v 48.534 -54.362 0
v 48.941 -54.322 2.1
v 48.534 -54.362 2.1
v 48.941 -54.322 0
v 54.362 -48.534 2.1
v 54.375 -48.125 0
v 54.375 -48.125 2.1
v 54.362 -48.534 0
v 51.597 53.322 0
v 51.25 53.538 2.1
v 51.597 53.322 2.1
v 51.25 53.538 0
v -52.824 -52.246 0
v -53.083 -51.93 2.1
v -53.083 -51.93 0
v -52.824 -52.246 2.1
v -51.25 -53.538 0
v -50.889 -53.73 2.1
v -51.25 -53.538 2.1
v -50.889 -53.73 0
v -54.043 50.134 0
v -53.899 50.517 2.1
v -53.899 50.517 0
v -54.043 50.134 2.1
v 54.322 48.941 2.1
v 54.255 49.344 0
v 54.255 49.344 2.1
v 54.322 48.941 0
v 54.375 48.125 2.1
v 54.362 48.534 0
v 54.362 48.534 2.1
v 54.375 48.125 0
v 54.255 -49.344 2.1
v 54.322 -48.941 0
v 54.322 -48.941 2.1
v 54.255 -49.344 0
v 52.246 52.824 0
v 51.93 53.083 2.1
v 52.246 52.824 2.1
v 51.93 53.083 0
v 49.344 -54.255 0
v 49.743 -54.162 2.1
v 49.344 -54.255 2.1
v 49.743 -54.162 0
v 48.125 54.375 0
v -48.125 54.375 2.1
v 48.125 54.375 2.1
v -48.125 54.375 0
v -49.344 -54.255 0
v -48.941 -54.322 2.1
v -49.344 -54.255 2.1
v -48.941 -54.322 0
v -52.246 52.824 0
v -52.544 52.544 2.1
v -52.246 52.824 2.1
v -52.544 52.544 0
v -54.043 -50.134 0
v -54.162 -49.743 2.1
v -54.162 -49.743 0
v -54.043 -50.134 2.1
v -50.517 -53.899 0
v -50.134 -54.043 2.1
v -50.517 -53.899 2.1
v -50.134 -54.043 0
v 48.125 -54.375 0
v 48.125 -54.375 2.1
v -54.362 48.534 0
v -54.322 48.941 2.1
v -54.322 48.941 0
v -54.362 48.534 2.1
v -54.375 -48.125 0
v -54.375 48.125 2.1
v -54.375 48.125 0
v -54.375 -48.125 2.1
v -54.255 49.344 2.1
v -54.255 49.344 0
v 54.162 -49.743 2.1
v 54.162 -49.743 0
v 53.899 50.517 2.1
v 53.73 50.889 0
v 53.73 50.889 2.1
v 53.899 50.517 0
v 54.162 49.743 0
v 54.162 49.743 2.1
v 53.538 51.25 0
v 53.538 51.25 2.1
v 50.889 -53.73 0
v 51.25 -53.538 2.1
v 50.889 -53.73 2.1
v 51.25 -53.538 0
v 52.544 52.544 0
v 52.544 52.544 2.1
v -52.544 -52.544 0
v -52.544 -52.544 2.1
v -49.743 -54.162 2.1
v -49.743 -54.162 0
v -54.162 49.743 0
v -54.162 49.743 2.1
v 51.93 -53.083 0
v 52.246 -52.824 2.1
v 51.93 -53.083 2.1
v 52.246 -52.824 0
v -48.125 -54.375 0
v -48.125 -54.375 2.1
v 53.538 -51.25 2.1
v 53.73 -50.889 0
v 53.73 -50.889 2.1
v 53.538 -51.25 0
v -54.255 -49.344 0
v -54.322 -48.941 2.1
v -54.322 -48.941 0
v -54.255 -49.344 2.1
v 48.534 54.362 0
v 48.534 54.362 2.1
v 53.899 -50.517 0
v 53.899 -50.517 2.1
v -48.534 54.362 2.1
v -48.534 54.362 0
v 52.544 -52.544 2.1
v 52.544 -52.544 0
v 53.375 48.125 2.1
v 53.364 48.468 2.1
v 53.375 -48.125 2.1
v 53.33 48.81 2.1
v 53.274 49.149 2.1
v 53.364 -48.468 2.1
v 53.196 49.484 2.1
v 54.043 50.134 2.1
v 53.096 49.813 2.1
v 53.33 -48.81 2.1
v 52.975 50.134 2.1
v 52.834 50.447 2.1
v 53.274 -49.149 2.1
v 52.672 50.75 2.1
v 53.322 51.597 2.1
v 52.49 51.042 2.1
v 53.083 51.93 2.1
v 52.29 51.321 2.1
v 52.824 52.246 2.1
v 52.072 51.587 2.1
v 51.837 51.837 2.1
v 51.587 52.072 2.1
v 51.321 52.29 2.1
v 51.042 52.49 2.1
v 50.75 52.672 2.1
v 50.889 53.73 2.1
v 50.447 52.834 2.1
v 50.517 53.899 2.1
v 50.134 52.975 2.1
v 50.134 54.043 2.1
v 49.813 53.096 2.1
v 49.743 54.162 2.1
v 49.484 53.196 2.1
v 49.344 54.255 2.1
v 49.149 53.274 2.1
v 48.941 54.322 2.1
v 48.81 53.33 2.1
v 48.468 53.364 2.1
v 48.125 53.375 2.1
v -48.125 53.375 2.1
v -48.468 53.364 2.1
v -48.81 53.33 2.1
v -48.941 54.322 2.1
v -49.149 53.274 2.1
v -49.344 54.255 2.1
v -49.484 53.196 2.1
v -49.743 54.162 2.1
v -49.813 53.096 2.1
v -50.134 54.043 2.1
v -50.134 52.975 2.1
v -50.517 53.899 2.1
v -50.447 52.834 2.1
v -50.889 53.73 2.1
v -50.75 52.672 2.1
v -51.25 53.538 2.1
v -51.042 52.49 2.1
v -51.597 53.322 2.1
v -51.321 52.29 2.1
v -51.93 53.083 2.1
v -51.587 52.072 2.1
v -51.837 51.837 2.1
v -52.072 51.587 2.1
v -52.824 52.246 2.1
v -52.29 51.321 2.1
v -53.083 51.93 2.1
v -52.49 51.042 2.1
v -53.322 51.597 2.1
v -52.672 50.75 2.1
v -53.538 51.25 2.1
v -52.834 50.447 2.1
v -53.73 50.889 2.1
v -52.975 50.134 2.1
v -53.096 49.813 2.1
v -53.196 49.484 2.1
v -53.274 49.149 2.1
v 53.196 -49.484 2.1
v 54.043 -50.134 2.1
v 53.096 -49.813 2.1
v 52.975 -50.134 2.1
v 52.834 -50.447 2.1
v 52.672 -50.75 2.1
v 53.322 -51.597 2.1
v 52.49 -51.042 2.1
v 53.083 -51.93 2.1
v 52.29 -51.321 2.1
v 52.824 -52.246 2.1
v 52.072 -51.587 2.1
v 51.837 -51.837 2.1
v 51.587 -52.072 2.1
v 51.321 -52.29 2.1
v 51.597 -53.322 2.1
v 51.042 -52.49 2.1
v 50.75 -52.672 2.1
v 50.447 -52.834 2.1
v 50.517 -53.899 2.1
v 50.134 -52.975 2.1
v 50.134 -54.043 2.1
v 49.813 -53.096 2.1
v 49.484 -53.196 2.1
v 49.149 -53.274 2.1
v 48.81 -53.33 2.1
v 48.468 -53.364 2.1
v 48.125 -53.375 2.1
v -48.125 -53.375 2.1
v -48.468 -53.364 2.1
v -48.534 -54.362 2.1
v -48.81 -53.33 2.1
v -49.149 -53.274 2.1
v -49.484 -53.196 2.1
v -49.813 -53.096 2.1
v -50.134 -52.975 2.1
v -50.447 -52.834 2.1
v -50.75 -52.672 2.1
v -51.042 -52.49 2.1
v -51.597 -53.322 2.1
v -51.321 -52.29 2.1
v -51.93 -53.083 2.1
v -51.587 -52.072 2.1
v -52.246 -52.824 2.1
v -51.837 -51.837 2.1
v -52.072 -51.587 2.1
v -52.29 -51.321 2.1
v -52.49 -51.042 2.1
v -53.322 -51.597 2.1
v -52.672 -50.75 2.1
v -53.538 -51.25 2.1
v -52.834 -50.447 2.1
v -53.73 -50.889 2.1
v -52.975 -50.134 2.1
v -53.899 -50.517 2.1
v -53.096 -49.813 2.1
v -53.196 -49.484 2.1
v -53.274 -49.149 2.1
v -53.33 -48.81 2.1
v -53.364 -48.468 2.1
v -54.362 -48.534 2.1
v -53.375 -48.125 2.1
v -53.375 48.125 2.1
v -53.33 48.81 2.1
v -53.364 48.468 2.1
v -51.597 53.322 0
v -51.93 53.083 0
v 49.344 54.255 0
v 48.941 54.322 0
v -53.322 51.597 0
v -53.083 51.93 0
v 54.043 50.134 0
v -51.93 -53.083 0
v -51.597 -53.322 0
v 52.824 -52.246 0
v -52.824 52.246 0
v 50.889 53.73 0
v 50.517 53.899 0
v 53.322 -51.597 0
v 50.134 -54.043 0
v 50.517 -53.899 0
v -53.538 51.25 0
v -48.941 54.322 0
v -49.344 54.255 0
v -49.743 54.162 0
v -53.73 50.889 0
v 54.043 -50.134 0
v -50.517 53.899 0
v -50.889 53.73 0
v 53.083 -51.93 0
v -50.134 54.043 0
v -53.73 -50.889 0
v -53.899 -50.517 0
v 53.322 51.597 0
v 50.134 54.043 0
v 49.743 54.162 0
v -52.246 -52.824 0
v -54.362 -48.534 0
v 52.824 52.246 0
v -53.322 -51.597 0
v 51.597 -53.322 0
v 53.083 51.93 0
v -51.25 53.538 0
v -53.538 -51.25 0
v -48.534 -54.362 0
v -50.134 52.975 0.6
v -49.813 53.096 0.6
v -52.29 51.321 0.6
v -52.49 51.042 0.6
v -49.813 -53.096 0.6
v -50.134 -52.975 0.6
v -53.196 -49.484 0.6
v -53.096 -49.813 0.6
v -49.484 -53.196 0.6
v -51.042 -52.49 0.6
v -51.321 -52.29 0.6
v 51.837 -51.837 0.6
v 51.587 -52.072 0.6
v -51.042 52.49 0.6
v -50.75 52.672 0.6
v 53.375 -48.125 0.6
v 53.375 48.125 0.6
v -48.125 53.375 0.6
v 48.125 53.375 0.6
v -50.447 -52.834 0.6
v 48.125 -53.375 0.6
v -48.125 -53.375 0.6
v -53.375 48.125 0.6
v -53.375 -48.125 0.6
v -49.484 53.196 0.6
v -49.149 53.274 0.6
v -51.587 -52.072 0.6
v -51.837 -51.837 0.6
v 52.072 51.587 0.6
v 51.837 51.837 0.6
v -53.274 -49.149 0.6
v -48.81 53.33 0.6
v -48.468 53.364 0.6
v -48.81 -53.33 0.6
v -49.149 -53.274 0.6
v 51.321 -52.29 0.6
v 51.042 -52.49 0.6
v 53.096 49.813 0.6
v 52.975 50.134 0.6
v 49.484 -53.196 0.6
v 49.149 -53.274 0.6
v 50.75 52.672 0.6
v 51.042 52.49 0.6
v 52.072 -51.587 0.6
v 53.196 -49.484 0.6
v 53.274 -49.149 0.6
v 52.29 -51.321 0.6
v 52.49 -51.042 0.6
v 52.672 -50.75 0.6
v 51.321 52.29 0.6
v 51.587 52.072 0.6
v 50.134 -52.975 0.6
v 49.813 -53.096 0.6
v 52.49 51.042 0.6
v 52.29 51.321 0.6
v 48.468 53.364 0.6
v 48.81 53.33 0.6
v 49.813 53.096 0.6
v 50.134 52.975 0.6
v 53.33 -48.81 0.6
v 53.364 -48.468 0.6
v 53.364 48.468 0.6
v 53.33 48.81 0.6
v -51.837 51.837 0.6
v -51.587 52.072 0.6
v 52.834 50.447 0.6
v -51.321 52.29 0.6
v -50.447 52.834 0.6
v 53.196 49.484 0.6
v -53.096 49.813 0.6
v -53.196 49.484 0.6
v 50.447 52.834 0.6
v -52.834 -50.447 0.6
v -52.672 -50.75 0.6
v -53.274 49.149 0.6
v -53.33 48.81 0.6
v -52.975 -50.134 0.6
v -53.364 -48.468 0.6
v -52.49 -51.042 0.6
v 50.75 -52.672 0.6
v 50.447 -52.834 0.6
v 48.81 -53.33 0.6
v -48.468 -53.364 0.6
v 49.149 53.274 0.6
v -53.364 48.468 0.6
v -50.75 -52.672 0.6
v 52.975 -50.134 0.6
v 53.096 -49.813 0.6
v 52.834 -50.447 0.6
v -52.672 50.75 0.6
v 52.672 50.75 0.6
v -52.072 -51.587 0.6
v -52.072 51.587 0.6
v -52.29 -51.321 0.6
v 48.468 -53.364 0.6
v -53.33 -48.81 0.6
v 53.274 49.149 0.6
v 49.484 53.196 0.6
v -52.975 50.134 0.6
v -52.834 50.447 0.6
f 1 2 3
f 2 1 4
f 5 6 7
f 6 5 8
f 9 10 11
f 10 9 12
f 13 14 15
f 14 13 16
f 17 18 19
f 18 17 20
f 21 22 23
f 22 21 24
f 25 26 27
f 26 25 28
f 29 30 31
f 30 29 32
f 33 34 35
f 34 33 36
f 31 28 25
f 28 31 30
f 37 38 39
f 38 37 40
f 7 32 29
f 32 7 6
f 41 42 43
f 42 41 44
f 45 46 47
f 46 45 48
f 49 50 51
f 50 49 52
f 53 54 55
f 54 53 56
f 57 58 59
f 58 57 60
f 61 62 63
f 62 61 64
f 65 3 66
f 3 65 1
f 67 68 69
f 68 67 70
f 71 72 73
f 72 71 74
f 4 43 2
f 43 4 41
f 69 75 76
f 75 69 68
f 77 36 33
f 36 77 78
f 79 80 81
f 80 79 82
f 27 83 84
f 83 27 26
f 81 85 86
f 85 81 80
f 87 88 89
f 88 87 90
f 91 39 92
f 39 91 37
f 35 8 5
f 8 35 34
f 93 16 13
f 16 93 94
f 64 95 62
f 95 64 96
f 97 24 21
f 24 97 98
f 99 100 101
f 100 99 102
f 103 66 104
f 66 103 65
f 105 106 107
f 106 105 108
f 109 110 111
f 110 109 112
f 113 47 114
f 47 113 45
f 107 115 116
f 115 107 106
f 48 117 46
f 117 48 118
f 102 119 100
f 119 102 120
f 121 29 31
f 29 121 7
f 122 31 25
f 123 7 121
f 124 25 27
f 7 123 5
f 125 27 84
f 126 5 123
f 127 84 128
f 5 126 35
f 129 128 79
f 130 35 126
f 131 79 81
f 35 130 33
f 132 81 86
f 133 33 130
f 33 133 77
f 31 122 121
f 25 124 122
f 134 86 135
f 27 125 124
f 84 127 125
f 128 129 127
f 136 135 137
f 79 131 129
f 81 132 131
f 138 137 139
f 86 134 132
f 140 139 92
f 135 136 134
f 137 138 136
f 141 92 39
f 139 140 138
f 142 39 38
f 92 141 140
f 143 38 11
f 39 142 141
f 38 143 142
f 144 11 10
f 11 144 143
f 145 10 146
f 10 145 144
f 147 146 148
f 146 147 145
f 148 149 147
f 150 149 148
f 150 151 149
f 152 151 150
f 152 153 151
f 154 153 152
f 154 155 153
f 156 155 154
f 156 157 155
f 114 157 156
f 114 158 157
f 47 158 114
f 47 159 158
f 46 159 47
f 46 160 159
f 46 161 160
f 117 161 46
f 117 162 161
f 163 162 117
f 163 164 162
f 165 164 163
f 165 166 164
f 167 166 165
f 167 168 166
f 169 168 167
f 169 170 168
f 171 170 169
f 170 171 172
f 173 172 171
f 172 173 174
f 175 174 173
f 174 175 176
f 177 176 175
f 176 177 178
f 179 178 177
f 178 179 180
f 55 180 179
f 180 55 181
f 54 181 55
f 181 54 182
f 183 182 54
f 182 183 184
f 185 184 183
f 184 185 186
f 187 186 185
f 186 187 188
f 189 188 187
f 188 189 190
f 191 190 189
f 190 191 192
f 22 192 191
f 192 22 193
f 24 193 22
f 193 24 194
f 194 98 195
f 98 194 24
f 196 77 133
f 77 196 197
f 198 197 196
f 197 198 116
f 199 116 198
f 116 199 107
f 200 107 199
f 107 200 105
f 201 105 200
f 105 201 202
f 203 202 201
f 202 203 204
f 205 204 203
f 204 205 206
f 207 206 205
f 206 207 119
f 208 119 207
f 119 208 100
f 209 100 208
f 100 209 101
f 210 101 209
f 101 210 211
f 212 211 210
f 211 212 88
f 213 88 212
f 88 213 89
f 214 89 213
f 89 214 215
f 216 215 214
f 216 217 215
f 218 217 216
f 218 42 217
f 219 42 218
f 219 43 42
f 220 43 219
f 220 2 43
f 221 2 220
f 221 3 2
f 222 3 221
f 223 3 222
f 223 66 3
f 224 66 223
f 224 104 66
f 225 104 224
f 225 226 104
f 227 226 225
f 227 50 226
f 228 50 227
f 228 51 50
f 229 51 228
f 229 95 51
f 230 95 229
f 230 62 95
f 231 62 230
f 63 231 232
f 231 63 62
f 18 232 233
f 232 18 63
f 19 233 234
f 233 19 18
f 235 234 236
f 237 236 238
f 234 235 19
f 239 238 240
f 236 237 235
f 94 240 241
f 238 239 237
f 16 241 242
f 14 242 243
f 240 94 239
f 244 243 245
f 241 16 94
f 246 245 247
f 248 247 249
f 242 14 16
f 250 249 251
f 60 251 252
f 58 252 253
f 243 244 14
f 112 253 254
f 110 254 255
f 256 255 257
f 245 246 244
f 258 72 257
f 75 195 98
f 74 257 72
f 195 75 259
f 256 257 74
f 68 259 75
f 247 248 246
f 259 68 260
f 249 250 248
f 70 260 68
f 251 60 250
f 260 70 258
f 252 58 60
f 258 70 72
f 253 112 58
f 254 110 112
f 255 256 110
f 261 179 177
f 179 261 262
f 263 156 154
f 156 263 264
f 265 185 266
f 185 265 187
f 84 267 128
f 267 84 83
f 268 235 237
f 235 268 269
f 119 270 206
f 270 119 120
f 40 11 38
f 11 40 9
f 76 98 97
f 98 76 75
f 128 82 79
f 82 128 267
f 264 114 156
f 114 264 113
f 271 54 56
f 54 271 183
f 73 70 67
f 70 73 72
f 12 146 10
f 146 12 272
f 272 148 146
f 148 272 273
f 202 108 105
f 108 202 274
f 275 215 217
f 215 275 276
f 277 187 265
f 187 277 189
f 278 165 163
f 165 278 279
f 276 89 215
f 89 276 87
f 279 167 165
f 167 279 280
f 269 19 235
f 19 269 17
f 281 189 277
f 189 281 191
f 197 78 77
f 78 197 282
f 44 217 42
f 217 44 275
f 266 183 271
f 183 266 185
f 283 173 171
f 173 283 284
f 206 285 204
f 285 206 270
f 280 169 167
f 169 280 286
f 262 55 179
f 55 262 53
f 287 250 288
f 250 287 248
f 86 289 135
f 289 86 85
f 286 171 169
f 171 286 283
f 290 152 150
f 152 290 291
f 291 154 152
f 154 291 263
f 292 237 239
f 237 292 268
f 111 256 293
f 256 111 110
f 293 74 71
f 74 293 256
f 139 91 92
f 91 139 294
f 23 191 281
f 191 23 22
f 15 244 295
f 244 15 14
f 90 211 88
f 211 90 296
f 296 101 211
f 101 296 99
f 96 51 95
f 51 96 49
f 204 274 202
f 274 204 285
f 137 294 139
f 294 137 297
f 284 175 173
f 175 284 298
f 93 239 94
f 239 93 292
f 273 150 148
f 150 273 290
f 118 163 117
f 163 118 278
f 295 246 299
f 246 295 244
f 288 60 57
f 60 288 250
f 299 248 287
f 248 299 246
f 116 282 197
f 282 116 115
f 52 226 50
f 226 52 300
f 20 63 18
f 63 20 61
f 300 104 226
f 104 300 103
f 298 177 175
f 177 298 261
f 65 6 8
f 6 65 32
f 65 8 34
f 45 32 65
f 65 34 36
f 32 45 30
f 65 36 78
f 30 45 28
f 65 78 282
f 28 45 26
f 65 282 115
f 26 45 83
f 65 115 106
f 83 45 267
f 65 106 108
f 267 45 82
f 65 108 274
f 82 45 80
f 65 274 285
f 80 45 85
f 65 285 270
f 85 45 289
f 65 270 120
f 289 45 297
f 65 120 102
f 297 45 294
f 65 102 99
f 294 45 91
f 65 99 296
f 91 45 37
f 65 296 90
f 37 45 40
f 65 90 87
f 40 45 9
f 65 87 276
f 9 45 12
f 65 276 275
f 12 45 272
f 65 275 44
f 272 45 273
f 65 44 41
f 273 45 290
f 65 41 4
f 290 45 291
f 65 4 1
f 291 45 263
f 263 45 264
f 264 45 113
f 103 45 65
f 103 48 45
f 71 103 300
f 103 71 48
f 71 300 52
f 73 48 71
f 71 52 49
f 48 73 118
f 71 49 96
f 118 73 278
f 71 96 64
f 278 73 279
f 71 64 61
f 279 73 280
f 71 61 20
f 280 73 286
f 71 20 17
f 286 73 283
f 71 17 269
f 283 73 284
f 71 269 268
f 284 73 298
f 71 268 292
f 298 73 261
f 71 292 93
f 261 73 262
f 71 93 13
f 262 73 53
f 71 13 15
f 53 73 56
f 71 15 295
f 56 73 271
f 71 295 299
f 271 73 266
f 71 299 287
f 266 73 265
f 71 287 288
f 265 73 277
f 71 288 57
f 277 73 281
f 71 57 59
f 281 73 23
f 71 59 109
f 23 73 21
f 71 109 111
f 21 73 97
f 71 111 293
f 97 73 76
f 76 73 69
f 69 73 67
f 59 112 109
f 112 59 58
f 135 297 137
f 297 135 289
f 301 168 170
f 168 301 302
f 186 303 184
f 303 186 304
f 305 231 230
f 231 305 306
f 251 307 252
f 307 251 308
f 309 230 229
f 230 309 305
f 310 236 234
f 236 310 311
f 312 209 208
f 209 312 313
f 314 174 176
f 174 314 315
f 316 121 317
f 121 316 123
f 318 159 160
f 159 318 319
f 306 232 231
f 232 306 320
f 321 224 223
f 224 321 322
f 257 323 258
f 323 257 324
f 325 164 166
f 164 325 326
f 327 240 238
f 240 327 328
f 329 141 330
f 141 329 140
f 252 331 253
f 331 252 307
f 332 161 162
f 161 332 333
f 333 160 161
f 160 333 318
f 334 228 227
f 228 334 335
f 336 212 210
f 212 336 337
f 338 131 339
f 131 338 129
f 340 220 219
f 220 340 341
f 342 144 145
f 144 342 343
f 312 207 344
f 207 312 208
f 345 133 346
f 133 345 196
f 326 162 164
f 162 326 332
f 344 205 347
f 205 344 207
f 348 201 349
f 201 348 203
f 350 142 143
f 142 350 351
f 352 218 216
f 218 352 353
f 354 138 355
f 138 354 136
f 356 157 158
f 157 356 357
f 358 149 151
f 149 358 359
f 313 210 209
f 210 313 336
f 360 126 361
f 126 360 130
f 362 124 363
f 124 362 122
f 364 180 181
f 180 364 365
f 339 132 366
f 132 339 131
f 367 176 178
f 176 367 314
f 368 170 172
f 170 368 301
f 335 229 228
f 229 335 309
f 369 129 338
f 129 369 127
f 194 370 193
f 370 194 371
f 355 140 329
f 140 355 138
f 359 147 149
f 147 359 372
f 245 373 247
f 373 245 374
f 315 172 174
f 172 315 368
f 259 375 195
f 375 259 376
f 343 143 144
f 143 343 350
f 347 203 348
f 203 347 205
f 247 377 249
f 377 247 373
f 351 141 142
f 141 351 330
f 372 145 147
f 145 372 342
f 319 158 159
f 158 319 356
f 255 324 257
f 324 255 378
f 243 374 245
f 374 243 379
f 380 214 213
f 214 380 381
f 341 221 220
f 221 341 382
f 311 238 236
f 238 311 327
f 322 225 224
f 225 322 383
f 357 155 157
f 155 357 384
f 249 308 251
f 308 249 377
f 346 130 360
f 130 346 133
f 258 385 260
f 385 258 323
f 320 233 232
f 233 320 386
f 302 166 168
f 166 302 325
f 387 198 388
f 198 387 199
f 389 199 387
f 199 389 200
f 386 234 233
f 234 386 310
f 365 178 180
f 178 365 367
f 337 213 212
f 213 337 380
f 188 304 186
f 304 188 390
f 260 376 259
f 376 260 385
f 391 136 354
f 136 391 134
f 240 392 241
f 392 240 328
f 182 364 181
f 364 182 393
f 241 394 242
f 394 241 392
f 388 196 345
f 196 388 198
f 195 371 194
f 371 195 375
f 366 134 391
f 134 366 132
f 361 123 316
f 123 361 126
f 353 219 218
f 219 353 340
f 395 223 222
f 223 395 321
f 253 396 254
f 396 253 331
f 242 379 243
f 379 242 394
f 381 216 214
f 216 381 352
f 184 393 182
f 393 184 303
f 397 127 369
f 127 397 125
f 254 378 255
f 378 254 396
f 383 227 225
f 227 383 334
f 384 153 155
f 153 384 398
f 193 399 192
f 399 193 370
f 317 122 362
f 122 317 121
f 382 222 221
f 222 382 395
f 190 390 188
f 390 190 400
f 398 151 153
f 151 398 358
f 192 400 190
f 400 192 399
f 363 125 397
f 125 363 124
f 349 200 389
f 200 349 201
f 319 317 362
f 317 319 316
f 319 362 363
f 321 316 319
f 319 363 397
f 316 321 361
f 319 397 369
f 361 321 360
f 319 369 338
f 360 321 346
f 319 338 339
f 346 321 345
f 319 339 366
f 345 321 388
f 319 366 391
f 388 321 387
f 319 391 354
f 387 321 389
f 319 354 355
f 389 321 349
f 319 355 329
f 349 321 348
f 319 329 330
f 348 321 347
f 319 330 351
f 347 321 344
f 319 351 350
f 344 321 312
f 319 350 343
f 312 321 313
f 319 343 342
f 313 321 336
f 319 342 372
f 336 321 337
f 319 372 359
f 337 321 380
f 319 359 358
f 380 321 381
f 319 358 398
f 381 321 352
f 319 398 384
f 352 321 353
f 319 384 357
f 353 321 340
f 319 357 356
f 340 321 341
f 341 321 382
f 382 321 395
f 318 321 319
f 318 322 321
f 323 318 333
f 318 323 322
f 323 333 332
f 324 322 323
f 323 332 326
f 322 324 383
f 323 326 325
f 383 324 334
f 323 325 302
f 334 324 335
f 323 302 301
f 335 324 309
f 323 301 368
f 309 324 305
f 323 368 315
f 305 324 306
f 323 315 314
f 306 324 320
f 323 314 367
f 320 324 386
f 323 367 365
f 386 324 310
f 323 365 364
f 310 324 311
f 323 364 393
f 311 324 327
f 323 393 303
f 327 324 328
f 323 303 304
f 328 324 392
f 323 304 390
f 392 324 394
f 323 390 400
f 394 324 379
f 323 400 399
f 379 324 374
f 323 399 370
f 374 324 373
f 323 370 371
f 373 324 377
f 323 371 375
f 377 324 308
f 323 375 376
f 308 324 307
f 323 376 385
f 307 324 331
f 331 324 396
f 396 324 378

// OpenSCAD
// file: dimensions.scad
// Shared dimensions for the magnetic holder and TPU protective sleeve.
// All dimensions are in millimeters unless the name ends in _in.

inch = 25.4;

// ---- Steel plate inputs (inches) ----
steel_plate_width_in = 4;
steel_plate_thickness_in = 3 / 16;
plate_width = steel_plate_width_in * inch;
plate_thickness = steel_plate_thickness_in * inch;
plate_clearance_xy = 0.25;
plate_clearance_z = 0.20;

// ---- Magnets (nominal 1/2 in diameter x 1/4 in thick) ----
magnet_diameter = 1 / 2 * inch;
magnet_thickness = 1 / 4 * inch;
magnet_hole_fit = -0.10;  // negative = press fit; increase if holes print tight
magnet_count = 6;
magnet_pattern_radius = 37;

// ---- Holder structure ----
rim_width = 2.20;
corner_radius = 5;
backing_plate_thickness = 1 / 4 * inch;
epsilon = 0.05;

plate_pocket_width = plate_width + plate_clearance_xy;
plate_pocket_depth = plate_thickness + plate_clearance_z;
magnet_pocket_diameter = magnet_diameter + magnet_hole_fit;
holder_width = plate_pocket_width + 2 * rim_width;
holder_height = plate_pocket_depth + backing_plate_thickness;
// main file
// Thin TPU bumper sleeve for the magnet face of magnet-plate-holder.scad.
// It forms a soft barrier between the magnets and the mounting surface.

include <dimensions.scad>;

$fn = 96;

// ---- TPU sleeve fit ----
sleeve_floor_thickness = 0.60; // protective layer over the magnets
sleeve_wall_thickness = 1.00;
sleeve_wall_height = 1.50;     // how far the rim grips the holder sides
sleeve_fit_clearance = 0.25;   // clearance on each side; tune for your TPU

sleeve_inner_width = holder_width + 2 * sleeve_fit_clearance;
sleeve_inner_corner_radius = corner_radius + sleeve_fit_clearance;
sleeve_outer_width = sleeve_inner_width + 2 * sleeve_wall_thickness;
sleeve_outer_corner_radius = sleeve_inner_corner_radius + sleeve_wall_thickness;
sleeve_height = sleeve_floor_thickness + sleeve_wall_height;

module rounded_square(size, radius, height) {
    hull()
        for (x = [-size / 2 + radius, size / 2 - radius])
            for (y = [-size / 2 + radius, size / 2 - radius])
                translate([x, y, 0])
                    cylinder(r = radius, h = height);
}

module protective_tpu_sleeve() {
    difference() {
        rounded_square(sleeve_outer_width, sleeve_outer_corner_radius, sleeve_height);

        // The shallow inner cavity receives the magnet face and creates a
        // flexible rim that grips the holder's outside edge.
        translate([0, 0, sleeve_floor_thickness])
            rounded_square(sleeve_inner_width, sleeve_inner_corner_radius,
                           sleeve_wall_height + epsilon);
    }
}

protective_tpu_sleeve();
